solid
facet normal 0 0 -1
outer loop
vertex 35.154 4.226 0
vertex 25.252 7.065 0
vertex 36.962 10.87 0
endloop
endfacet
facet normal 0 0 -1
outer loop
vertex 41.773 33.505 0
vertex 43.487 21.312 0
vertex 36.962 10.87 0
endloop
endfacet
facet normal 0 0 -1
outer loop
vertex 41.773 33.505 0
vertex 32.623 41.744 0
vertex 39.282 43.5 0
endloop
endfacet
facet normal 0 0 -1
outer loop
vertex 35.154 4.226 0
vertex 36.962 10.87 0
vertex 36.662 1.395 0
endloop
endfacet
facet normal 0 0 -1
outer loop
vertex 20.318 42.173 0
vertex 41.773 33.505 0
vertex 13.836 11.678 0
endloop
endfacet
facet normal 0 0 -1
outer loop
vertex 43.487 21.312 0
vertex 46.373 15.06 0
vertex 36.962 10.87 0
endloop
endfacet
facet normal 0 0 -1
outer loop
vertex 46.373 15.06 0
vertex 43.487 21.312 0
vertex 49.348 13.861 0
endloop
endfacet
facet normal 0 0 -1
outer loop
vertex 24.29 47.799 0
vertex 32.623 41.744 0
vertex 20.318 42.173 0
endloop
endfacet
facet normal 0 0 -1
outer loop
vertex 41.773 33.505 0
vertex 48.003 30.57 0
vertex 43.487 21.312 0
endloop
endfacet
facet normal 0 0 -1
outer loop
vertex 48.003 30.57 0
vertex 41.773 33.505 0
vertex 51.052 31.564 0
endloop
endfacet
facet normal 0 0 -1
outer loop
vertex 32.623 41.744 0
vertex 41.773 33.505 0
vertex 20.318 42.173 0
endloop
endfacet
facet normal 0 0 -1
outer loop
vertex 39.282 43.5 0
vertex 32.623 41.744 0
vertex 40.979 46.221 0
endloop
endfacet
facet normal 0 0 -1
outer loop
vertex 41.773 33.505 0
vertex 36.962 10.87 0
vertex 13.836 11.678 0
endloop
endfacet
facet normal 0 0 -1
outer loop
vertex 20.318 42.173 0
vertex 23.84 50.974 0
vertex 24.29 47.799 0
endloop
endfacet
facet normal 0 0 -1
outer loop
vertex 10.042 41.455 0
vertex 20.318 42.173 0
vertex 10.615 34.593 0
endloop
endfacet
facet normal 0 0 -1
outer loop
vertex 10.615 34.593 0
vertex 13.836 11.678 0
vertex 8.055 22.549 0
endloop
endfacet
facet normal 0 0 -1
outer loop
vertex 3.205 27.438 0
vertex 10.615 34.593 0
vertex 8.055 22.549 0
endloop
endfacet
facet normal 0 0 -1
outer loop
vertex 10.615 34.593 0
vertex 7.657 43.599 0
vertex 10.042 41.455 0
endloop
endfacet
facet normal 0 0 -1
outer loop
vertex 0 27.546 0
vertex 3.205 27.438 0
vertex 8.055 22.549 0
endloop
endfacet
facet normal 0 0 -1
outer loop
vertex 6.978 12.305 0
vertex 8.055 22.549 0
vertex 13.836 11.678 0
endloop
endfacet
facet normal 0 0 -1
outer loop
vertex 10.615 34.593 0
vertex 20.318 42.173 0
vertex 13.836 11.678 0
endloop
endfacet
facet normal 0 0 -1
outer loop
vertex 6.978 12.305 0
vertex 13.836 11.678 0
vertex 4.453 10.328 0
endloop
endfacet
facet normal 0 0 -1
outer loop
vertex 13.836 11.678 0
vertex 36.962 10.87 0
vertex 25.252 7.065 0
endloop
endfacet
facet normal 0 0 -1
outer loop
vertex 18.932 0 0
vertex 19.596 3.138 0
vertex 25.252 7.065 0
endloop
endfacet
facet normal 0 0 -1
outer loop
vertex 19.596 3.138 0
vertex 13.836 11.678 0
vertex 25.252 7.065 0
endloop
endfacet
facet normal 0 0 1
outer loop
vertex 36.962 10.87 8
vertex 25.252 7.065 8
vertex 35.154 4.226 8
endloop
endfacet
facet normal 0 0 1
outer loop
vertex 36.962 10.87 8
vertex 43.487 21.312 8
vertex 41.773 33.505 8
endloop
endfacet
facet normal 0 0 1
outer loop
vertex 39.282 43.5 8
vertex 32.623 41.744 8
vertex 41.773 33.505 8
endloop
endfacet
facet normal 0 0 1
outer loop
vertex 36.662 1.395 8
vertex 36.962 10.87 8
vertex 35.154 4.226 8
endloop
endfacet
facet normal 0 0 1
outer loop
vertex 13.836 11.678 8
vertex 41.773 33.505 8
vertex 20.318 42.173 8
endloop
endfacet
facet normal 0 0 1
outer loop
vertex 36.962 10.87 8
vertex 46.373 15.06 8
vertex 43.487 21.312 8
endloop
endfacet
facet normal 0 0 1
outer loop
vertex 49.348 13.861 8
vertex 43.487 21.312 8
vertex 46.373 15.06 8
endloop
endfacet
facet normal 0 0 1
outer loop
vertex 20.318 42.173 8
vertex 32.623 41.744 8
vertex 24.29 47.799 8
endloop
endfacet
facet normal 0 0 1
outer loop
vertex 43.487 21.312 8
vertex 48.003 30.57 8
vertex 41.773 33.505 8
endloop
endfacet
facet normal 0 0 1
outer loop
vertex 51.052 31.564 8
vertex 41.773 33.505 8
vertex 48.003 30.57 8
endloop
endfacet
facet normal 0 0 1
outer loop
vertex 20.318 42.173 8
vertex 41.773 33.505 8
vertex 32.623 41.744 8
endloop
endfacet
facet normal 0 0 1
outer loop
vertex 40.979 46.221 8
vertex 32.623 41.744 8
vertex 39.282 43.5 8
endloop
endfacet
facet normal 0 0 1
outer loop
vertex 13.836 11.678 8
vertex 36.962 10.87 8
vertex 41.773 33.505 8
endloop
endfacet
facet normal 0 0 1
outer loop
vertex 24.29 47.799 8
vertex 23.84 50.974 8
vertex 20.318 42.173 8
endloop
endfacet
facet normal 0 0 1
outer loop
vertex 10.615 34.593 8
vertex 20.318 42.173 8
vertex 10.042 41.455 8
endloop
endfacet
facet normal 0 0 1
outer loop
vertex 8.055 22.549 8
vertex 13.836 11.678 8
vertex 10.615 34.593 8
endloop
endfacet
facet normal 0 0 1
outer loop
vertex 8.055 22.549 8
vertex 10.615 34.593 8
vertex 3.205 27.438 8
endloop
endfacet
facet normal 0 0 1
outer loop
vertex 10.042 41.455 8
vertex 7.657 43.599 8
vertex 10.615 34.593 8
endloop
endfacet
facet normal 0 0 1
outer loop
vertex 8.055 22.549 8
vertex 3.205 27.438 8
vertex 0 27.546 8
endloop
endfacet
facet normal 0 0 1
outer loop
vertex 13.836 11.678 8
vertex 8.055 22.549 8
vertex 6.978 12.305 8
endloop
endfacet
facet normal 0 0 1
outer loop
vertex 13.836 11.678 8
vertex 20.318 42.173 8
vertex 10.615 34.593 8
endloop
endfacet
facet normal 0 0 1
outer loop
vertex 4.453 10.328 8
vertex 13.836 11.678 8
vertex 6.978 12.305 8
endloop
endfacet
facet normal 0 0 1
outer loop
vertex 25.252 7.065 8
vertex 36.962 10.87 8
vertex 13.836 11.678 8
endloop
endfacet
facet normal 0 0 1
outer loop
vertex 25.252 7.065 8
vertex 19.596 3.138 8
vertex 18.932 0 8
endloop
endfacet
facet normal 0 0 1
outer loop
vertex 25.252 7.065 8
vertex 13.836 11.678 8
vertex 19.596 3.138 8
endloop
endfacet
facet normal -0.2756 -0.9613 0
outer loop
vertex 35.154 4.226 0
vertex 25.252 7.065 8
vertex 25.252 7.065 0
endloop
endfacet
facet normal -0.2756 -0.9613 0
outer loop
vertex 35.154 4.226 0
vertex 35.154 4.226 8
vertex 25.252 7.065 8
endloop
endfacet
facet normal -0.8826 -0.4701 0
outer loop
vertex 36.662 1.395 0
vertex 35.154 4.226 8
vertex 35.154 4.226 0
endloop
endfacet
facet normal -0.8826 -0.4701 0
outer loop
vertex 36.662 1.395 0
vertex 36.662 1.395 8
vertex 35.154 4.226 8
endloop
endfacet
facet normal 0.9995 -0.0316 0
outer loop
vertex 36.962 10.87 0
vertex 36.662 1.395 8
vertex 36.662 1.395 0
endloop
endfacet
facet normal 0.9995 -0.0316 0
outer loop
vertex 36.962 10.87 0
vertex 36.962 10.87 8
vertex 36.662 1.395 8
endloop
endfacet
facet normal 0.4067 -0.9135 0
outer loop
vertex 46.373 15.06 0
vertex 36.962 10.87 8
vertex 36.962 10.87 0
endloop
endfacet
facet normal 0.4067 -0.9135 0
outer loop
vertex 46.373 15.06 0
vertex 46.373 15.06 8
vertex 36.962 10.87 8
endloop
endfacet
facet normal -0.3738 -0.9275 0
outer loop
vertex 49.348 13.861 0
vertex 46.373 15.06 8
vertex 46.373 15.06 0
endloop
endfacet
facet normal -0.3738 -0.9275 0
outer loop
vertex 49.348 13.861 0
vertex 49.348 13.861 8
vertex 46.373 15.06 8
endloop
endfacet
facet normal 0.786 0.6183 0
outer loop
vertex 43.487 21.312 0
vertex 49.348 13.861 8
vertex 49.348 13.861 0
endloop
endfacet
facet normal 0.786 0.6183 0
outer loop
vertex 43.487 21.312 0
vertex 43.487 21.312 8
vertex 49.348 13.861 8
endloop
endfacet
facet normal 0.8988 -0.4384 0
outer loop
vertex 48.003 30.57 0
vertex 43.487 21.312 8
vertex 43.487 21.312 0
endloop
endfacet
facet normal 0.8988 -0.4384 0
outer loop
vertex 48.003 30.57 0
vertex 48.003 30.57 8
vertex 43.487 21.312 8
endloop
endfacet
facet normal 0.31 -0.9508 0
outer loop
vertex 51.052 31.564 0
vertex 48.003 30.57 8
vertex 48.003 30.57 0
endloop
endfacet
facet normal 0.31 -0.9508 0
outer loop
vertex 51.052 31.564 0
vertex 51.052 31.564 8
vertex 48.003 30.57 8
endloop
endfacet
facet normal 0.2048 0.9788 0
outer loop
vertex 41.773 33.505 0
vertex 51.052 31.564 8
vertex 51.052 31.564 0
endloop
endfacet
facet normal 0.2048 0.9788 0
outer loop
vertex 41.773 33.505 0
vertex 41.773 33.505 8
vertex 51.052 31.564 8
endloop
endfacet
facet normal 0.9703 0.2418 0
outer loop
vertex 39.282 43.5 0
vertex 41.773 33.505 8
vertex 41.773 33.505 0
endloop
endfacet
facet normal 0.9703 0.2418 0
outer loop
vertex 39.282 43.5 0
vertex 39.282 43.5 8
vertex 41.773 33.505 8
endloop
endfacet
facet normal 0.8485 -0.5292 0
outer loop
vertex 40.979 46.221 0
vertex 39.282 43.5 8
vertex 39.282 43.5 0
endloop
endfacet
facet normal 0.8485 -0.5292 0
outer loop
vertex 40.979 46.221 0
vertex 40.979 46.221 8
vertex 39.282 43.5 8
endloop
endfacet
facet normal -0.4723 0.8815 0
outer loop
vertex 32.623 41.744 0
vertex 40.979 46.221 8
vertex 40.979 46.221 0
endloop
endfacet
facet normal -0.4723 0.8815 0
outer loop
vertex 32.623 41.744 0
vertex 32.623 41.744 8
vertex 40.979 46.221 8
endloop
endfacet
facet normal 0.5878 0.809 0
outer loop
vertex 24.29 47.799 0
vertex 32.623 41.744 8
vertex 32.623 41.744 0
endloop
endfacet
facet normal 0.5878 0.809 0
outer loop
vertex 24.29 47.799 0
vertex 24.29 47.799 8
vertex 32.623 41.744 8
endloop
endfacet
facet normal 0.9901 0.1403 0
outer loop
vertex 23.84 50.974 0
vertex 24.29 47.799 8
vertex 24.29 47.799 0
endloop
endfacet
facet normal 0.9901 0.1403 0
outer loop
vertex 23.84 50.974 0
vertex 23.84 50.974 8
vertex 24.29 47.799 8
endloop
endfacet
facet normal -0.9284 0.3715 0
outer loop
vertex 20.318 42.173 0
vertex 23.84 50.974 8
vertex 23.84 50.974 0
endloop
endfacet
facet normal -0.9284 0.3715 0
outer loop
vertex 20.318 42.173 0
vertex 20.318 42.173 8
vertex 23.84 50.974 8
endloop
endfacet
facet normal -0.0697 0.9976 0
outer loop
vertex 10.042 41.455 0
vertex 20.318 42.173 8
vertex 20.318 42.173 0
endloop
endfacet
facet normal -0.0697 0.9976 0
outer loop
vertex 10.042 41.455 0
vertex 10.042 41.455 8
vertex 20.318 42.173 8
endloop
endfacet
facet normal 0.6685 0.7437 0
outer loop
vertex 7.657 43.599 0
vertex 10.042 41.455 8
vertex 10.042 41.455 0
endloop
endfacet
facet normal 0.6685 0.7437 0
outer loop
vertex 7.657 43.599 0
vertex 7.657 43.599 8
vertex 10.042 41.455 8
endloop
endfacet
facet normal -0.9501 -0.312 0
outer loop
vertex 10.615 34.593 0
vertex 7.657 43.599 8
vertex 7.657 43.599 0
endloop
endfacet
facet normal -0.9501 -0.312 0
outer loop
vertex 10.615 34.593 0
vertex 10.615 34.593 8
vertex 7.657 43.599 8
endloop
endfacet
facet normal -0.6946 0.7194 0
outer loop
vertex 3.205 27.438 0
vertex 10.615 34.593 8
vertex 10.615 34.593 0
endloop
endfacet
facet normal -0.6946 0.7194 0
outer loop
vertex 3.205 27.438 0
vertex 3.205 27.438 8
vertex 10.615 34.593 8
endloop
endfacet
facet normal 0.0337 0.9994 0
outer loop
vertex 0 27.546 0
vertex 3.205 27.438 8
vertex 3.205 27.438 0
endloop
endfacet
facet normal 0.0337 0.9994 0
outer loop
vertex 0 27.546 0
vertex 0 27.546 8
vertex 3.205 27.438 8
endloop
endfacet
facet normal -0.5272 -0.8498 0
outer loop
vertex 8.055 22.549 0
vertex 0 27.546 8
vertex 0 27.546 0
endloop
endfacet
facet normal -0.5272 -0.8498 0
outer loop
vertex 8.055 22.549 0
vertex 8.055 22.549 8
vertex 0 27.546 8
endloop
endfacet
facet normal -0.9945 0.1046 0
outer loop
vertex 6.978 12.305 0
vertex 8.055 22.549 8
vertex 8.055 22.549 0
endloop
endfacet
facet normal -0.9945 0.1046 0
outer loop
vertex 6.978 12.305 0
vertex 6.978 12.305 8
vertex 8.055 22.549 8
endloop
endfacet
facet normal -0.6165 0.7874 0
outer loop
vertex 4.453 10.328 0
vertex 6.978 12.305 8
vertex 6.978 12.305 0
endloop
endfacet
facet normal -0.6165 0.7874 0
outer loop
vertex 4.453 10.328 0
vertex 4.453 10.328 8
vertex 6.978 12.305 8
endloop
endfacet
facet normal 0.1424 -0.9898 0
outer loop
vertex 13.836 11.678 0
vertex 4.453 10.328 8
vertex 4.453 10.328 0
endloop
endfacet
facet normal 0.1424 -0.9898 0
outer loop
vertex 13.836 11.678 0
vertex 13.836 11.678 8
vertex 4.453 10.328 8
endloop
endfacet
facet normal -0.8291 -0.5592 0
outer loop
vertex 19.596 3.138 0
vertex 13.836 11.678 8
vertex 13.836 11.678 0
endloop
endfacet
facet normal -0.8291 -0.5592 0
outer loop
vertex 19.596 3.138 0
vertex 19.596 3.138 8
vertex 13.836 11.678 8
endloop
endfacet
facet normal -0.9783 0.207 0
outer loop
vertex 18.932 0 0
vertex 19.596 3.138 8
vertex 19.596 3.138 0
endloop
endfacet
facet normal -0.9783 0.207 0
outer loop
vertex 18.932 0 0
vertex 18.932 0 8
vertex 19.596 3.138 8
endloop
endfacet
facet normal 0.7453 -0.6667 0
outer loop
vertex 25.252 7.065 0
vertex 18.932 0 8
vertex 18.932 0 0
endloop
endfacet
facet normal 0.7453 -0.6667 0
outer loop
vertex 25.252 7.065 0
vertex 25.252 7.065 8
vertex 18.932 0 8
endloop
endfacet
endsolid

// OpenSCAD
$fn = 32;

// ----------------------------------------------------------------------
// Fan rotor section: 9 blades, 18 mm hub radius, 8 mm blades
// ----------------------------------------------------------------------

// --- parameters (mm) ---
profile_height = 8;       // extrusion height
profile_points = 27;      // points of the closed outline

profile = [[43.487, 21.312], [48.003, 30.57], [51.052, 31.564], [41.773, 33.505], [39.282, 43.5], [40.979, 46.221], [32.623, 41.744], [24.29, 47.799], [23.84, 50.974], [20.318, 42.173], [10.042, 41.455], [7.657, 43.599], [10.615, 34.593], [3.205, 27.438], [0, 27.546], [8.055, 22.549], [6.978, 12.305], [4.453, 10.328], [13.836, 11.678], [19.596, 3.138], [18.932, 0], [25.252, 7.065], [35.154, 4.226], [36.662, 1.395], [36.962, 10.87], [46.373, 15.06], [49.348, 13.861]];  // single closed polygon, 27 points, counter clockwise

// --- the one profile operation ---
linear_extrude(height = profile_height) polygon(points = profile);
